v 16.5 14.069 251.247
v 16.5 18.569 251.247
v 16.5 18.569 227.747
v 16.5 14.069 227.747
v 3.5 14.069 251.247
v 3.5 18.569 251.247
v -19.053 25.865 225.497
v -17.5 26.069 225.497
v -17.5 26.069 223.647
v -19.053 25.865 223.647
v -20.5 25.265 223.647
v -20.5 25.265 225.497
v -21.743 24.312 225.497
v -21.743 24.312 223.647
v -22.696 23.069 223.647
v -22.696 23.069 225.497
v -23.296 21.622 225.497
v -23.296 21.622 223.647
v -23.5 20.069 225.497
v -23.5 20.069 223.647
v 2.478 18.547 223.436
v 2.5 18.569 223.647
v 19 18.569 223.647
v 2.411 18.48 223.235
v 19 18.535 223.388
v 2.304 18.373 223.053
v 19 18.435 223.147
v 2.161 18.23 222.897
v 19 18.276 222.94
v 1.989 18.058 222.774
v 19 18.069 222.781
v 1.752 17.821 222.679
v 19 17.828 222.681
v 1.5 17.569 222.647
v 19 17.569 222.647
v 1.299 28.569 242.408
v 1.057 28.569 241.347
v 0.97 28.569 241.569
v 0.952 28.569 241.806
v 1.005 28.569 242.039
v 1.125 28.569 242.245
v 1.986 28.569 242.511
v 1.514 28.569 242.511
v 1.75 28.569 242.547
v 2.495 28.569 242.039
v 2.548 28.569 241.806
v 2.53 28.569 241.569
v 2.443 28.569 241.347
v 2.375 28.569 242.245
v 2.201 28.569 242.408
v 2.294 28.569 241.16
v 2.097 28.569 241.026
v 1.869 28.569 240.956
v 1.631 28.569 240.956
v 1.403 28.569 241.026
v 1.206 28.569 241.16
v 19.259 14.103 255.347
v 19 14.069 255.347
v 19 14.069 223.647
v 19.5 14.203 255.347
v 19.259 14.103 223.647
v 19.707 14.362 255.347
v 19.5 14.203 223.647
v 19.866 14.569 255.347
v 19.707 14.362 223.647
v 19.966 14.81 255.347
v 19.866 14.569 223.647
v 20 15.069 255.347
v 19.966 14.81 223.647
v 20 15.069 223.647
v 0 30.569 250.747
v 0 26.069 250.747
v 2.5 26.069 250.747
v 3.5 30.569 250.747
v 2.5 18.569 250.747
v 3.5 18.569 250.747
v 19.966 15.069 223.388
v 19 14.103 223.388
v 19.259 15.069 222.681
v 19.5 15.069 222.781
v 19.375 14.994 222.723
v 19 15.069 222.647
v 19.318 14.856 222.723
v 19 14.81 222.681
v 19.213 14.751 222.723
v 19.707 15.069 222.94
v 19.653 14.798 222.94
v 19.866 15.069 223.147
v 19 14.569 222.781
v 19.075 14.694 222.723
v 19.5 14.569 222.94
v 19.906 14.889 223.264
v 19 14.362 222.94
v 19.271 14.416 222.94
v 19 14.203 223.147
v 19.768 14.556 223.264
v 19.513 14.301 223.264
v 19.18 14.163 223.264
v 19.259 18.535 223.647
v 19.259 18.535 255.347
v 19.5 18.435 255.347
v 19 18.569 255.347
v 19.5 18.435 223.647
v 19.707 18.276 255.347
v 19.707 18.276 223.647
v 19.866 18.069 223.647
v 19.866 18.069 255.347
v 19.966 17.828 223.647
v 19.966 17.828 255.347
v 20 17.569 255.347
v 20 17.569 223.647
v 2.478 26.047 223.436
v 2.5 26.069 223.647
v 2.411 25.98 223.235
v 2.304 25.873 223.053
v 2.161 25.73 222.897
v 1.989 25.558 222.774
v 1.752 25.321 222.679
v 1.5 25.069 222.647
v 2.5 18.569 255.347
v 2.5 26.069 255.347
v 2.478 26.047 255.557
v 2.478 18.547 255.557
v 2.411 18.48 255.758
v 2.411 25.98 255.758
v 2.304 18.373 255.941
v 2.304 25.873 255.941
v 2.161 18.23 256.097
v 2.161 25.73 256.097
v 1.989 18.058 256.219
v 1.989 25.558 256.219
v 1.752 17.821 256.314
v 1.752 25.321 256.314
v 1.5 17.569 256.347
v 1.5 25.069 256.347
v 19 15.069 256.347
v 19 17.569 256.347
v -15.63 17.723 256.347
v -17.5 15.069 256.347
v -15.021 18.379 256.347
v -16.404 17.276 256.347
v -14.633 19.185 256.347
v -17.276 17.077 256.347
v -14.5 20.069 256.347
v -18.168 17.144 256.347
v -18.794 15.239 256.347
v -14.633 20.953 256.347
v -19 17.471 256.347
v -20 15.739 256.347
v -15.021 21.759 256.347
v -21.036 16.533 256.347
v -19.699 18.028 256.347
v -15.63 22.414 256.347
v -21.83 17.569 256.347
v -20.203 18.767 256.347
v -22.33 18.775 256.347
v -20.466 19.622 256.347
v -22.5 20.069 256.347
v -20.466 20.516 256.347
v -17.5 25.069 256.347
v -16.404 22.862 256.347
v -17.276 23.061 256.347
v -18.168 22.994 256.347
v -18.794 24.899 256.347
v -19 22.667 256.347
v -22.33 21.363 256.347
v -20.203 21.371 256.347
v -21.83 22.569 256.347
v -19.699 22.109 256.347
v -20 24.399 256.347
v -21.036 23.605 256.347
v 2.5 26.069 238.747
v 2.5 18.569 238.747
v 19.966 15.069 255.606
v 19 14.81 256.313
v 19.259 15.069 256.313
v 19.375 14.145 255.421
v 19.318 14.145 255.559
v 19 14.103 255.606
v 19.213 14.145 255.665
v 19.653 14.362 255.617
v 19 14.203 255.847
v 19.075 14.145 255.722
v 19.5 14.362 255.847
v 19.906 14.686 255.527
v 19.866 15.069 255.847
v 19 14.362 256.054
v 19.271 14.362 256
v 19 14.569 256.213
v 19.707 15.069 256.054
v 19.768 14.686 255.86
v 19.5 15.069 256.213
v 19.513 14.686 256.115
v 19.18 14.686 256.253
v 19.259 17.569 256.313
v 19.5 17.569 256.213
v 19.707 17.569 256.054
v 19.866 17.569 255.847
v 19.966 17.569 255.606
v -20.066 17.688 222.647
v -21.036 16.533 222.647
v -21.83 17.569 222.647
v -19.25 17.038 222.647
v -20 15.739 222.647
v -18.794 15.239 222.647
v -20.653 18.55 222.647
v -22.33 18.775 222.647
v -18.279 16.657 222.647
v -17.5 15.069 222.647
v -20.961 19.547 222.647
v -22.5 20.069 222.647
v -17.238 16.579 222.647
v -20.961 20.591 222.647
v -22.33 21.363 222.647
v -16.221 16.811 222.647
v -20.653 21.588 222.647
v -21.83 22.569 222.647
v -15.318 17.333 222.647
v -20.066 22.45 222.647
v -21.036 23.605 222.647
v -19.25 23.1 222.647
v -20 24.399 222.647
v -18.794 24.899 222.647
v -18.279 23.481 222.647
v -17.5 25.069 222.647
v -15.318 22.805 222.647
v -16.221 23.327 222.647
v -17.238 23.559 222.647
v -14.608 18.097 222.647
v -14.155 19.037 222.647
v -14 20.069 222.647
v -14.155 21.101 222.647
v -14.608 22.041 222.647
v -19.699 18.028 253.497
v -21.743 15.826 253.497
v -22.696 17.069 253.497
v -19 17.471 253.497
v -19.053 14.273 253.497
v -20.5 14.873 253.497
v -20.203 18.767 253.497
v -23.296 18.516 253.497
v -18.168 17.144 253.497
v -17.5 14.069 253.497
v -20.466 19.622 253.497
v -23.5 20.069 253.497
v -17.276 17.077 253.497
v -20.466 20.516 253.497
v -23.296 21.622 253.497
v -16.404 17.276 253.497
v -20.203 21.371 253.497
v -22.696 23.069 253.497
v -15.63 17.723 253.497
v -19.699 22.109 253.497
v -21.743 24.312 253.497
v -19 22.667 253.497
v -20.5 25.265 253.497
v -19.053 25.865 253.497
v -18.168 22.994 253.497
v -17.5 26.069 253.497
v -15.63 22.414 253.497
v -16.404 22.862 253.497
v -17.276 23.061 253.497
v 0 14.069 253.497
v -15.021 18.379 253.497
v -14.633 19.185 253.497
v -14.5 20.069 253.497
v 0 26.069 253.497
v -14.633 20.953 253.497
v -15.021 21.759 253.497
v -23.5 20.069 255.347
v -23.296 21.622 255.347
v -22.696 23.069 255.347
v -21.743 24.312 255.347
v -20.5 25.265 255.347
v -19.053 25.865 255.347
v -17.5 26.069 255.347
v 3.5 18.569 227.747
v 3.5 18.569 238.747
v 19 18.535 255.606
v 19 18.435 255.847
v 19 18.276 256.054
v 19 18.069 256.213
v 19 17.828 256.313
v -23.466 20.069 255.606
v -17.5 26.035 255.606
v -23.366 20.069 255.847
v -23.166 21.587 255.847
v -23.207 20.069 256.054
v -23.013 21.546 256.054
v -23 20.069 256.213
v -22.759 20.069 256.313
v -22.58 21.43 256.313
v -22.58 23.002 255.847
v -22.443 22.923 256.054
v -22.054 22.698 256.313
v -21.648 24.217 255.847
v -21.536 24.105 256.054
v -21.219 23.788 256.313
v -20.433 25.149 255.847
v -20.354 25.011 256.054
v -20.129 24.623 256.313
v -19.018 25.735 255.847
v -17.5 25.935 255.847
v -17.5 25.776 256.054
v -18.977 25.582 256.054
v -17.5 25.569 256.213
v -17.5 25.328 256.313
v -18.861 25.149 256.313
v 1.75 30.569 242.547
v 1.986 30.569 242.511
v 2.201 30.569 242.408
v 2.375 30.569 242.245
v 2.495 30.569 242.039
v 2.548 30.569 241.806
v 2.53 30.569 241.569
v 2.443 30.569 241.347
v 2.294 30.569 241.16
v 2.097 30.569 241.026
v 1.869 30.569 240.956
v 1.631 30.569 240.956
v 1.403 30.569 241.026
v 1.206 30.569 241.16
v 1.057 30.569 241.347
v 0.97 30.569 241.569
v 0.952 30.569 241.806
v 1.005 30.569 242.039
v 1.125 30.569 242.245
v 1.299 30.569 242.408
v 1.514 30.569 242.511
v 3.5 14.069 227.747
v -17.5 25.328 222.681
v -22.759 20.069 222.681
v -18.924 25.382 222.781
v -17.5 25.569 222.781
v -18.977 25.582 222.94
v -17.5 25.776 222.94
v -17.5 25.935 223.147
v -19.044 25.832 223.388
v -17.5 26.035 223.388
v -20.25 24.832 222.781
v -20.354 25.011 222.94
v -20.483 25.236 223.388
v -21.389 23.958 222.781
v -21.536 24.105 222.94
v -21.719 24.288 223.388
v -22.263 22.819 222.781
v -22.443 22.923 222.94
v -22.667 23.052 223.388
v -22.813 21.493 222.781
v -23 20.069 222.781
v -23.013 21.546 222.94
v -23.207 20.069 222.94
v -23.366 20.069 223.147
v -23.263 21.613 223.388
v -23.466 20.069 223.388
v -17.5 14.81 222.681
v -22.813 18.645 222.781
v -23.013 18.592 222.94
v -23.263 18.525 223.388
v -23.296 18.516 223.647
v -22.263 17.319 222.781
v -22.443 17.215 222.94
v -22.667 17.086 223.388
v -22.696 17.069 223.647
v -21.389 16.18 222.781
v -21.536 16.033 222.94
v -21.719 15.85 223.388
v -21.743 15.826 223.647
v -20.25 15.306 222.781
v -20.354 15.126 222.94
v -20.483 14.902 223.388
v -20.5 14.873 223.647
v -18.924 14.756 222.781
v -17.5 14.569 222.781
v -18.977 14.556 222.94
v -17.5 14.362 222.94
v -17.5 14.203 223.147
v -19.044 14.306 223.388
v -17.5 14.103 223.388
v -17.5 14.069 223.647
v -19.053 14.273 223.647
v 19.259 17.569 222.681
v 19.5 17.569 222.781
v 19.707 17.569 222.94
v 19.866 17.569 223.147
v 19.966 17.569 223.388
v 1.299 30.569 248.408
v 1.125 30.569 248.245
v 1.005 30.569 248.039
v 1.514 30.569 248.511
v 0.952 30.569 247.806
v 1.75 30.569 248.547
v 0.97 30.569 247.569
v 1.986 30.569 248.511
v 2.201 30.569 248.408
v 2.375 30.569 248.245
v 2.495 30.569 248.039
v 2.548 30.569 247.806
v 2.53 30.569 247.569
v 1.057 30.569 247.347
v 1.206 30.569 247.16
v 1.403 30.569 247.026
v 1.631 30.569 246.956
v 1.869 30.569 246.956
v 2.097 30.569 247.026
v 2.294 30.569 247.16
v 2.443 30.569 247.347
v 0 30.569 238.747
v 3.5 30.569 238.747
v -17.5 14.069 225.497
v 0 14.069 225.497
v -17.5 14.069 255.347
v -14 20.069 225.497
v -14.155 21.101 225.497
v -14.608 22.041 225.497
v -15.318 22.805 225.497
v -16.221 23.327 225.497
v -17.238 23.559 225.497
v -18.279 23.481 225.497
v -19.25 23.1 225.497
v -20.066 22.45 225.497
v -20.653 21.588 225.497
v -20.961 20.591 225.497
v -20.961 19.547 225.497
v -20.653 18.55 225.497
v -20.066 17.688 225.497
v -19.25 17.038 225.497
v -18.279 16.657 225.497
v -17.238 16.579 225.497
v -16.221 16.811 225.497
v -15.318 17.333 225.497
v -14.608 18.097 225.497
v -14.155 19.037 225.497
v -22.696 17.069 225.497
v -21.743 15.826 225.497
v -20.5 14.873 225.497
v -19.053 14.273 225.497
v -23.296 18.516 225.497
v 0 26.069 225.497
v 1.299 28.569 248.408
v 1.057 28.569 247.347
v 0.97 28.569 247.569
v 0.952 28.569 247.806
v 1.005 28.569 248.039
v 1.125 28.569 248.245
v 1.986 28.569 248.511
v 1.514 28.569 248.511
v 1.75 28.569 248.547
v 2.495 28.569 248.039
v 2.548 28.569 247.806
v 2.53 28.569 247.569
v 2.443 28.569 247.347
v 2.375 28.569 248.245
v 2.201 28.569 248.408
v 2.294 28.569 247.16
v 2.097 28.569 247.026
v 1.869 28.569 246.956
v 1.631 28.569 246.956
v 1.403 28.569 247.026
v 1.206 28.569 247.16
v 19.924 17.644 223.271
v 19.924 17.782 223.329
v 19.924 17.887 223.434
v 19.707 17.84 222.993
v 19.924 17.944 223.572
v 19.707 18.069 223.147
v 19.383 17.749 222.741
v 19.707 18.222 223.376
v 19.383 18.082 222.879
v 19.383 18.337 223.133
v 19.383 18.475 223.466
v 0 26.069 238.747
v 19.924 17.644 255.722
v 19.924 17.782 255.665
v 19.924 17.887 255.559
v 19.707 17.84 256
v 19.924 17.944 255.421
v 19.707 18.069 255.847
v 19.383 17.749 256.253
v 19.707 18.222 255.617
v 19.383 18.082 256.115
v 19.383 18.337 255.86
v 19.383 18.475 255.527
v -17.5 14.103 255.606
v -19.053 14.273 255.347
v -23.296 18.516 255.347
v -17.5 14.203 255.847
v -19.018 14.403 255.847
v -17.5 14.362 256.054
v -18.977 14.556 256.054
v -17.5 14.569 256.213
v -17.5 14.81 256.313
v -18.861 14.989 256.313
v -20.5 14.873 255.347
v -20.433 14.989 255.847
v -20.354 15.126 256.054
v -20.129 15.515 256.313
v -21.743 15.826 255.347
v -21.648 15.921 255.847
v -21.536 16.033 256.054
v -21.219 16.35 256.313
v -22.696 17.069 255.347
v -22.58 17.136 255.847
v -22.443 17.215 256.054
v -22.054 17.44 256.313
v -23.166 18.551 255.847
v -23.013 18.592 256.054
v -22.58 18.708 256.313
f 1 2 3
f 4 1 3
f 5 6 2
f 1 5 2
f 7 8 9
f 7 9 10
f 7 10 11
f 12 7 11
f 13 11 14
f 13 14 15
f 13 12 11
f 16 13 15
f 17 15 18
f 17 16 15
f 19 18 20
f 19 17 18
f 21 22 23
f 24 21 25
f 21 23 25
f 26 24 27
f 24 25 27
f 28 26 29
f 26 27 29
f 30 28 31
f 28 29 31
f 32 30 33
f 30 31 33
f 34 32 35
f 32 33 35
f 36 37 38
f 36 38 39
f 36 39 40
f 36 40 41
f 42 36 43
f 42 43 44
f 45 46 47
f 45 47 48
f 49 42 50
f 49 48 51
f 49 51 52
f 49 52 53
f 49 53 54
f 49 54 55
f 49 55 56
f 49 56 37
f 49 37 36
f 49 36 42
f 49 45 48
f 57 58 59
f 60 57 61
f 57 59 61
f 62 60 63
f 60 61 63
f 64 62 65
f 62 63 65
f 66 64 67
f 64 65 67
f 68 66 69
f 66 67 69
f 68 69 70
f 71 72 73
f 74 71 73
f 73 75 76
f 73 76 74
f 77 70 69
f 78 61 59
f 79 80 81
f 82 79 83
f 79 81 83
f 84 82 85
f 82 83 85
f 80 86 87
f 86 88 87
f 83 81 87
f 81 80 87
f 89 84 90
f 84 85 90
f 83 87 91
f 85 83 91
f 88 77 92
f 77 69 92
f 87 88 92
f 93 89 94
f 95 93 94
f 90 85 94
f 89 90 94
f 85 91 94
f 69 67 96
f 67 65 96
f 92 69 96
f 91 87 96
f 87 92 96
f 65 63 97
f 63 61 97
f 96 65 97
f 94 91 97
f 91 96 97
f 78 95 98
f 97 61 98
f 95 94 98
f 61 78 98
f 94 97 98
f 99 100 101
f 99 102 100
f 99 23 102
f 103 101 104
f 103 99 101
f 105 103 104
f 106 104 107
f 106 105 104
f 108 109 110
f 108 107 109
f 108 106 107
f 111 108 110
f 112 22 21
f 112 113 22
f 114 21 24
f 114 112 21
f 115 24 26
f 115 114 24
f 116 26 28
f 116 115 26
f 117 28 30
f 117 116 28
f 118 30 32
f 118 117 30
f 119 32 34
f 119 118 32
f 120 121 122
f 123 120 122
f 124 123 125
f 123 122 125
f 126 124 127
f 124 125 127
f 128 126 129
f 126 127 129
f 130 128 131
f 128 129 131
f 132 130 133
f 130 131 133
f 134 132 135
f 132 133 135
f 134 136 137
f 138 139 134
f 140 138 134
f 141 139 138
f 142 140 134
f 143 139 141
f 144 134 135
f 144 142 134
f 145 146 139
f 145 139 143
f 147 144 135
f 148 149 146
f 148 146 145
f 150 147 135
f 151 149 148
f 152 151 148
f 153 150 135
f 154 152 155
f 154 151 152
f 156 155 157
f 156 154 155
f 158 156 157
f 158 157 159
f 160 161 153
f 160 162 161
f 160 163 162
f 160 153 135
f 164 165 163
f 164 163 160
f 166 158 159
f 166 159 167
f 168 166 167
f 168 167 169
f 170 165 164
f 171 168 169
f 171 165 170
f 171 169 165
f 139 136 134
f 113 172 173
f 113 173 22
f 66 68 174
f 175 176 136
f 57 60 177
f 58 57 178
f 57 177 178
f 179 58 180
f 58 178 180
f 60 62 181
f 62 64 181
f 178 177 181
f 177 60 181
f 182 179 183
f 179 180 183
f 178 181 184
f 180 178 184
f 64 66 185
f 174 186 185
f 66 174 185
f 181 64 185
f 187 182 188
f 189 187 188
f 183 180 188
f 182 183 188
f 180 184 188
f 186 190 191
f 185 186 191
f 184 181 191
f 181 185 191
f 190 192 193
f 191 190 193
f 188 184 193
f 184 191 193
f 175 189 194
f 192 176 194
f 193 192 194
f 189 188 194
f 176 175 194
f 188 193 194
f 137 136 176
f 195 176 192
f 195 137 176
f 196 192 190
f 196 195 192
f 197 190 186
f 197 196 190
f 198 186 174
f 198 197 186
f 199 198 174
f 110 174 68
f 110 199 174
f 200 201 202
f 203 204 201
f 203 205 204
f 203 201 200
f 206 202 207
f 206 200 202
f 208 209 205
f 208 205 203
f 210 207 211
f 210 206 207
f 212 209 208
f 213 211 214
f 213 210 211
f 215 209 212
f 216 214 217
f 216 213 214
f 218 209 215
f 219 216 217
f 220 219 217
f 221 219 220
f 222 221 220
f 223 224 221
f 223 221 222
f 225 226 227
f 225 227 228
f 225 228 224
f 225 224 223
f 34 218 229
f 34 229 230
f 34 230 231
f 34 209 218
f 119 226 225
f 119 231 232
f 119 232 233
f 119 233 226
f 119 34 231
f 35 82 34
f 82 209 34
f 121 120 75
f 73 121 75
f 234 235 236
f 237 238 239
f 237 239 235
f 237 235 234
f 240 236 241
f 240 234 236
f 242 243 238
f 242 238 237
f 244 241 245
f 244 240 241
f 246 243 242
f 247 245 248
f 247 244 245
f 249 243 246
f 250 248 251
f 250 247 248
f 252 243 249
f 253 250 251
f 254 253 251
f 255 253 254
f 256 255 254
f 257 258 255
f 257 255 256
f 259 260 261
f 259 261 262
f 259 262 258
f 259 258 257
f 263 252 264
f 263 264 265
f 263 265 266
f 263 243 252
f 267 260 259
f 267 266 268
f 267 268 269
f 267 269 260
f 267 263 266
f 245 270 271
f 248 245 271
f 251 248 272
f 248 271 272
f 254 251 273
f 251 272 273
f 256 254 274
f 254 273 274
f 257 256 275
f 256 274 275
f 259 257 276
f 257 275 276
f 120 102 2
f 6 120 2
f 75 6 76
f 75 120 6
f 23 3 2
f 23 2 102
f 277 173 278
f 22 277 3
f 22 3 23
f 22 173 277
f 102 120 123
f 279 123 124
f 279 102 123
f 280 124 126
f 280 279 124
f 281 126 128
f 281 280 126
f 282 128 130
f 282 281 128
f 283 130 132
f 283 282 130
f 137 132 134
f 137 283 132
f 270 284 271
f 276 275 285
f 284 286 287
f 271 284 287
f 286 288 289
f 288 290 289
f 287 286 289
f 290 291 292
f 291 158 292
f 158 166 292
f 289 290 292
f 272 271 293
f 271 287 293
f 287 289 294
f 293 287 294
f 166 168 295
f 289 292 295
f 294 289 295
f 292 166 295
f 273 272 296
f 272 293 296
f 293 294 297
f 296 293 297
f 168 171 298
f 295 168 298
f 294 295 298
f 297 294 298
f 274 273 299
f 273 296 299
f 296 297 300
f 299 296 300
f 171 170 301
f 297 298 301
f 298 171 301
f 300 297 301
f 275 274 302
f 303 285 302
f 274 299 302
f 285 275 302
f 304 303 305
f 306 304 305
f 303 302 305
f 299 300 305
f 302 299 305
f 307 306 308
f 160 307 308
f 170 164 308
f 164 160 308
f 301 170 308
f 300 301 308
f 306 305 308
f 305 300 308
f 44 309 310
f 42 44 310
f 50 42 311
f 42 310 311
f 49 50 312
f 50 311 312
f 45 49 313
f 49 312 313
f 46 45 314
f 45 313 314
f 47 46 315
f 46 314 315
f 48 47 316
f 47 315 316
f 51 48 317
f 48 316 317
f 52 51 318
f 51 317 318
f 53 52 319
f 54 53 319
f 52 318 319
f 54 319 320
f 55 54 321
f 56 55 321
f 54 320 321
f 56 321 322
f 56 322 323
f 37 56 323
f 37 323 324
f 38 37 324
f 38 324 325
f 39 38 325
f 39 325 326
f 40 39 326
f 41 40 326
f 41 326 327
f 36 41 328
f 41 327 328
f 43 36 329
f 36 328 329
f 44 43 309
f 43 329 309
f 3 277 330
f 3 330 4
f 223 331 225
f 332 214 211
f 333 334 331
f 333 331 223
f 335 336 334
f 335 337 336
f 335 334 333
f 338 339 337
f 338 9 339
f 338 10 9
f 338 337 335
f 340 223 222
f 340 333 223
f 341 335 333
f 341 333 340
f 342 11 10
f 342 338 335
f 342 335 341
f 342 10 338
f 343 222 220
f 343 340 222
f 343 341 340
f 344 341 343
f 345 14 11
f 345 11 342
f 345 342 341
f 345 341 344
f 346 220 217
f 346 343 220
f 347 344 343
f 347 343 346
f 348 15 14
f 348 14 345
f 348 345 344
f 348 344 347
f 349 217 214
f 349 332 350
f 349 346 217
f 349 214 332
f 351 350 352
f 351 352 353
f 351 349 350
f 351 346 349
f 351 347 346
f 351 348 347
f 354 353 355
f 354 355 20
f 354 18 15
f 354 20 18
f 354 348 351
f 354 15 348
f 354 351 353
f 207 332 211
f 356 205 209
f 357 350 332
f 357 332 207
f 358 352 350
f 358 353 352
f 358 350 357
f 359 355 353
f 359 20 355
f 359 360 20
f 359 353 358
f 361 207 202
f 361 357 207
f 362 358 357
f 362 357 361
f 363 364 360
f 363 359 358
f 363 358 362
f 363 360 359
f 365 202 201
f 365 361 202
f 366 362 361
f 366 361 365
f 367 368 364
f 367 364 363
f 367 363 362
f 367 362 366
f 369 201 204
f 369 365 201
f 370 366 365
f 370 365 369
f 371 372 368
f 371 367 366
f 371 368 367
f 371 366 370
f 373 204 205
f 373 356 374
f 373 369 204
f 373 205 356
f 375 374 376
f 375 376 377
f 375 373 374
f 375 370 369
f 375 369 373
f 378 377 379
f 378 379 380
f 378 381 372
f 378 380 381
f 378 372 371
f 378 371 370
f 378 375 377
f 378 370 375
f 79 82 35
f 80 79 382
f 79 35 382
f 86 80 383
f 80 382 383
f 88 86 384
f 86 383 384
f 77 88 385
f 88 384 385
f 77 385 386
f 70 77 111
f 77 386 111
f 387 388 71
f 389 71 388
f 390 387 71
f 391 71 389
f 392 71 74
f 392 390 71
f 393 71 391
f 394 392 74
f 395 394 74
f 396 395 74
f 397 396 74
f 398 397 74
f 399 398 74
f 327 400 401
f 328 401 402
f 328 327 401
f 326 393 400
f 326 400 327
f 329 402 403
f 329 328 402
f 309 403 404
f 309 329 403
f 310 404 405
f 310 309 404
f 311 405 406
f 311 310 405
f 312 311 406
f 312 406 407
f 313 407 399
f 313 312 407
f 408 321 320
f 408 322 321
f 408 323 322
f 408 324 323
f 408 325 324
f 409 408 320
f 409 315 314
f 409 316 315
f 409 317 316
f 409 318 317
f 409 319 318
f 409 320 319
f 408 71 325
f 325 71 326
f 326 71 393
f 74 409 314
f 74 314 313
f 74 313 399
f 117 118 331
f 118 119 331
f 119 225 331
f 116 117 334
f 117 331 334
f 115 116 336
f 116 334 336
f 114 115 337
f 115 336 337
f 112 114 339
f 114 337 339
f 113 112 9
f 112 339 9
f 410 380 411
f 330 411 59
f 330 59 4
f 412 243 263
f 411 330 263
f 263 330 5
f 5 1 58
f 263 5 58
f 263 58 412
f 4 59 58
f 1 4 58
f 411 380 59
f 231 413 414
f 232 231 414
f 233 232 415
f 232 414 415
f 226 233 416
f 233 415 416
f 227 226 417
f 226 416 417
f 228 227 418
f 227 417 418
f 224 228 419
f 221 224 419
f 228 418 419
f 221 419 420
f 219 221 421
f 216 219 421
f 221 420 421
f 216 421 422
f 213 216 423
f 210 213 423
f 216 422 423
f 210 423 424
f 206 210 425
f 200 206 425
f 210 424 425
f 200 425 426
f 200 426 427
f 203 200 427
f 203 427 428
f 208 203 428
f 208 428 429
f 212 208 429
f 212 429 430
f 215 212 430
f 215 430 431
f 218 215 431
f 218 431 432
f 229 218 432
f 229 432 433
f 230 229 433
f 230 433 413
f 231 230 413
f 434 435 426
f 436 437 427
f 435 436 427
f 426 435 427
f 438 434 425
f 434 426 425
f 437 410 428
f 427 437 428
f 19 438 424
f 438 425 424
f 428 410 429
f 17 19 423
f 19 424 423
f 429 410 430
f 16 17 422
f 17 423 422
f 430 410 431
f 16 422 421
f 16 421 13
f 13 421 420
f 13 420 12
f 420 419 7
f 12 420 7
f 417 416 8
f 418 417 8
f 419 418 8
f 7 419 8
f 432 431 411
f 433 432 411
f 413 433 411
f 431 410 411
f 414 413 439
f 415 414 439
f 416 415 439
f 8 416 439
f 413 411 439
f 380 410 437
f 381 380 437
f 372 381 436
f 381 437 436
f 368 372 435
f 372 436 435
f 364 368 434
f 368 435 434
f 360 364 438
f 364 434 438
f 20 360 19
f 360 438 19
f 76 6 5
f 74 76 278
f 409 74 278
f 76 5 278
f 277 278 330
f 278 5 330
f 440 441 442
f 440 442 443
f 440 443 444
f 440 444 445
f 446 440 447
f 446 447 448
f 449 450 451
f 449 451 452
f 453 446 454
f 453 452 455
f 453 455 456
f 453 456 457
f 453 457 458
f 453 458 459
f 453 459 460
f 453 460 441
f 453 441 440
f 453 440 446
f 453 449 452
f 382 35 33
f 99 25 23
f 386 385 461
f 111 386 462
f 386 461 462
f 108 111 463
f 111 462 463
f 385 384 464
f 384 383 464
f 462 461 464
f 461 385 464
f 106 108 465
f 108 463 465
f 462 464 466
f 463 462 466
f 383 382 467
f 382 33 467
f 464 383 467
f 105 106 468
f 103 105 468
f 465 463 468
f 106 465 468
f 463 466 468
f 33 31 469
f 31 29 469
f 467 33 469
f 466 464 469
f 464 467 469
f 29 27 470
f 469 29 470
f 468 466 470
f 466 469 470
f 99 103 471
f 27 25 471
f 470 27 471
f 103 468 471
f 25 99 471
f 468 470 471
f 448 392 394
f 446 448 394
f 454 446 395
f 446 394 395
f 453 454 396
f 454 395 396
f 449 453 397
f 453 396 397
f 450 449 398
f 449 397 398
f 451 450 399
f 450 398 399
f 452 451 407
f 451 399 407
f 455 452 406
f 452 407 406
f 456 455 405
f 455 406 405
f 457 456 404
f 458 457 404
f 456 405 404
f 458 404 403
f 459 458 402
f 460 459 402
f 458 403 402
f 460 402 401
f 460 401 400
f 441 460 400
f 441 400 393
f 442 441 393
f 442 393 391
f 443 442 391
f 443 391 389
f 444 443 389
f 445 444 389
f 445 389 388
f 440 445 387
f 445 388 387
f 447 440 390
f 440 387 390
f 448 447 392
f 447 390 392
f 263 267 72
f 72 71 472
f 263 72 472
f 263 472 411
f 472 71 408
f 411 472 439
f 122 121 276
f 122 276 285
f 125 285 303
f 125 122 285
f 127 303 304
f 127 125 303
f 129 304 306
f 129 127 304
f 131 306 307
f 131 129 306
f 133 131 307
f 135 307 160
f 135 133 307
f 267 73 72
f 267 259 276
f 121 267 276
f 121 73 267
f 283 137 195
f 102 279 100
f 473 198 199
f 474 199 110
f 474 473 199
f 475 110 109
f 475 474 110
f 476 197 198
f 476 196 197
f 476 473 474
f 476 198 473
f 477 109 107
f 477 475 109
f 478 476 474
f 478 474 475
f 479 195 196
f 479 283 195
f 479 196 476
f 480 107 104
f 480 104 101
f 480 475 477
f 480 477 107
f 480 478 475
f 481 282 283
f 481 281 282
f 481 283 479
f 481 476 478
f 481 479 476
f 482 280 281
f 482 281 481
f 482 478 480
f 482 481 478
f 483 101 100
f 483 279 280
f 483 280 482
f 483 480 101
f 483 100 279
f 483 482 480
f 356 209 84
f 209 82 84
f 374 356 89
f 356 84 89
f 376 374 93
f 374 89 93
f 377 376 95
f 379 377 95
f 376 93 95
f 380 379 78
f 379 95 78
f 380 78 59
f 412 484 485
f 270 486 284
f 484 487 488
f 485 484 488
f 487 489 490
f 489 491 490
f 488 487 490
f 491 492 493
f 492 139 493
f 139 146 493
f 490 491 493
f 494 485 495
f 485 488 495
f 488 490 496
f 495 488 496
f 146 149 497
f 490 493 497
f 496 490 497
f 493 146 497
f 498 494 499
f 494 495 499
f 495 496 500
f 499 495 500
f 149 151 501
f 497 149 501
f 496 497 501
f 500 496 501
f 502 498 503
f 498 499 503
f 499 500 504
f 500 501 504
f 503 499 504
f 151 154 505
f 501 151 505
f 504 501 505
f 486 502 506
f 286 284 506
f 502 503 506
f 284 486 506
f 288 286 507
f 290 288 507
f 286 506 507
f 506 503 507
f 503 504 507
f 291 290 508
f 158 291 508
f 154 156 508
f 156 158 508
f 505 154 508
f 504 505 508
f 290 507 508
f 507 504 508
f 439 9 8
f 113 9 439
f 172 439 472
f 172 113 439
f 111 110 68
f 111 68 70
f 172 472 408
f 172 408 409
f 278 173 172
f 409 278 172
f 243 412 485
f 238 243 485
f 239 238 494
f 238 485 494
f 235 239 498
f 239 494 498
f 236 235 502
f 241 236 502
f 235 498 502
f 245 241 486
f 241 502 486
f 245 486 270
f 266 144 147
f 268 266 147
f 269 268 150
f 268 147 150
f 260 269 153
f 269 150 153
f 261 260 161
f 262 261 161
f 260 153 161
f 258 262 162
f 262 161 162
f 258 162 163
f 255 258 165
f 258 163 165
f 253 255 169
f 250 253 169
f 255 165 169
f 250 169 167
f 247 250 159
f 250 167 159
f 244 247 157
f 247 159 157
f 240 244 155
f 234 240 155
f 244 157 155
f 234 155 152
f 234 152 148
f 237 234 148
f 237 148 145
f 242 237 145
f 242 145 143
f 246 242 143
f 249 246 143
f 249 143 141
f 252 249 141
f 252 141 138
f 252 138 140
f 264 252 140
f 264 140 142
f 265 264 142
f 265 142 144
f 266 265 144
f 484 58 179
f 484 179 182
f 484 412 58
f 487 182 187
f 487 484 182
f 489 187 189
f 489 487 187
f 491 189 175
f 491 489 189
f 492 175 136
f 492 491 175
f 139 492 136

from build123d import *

# Parameters (mm, degrees)
SKETCH1_W           = 33.7
SKETCH1_H           = 12
BOSS_EXTRUDE1_DEPTH = 2.5
SKETCH2_W           = 33.7
SKETCH2_H           = 4.5
BOSS_EXTRUDE2_DEPTH = 17.5
SKETCH3_W           = 13
SKETCH3_H           = 23.5
CUT_EXTRUDE1_DEPTH  = 258.235074474
SKETCH4_W           = 2.85
SKETCH4_H           = 12
BOSS_EXTRUDE3_DEPTH = 23.5
FILLET1_R           = 6
SKETCH5_R           = 3
CUT_EXTRUDE2_DEPTH  = 4
SKETCH6_R           = 3.5
CUT_EXTRUDE3_DEPTH  = 4
SKETCH7_W           = 3.5
SKETCH7_H           = 12
BOSS_EXTRUDE4_DEPTH = 12
FILLET2_R           = 1
SKETCH8_R           = 0.800000001
CUT_EXTRUDE4_DEPTH  = 2


with BuildPart() as part:
    # Sketch1 → Boss-Extrude1 (new body)
    with BuildSketch(Plane(origin=(0, 0, 0), x_dir=(0, 0, -1), z_dir=(1, 0, 0))):
        with Locations((-239.496705732, 20.068965517)):
            Rectangle(SKETCH1_W, SKETCH1_H)
    extrude(amount=BOSS_EXTRUDE1_DEPTH)

    # Sketch2 → Boss-Extrude2 (add)
    with BuildSketch(Plane(origin=(2.5, 0, 0), x_dir=(0, 0, -1), z_dir=(1, 0, 0))):
        with Locations((-239.496705732, 16.318965517)):
            Rectangle(SKETCH2_W, SKETCH2_H)
    extrude(amount=BOSS_EXTRUDE2_DEPTH)

    # Sketch3 → Cut-Extrude1 (cut, through all)
    with BuildSketch(Plane(origin=(0, 18.568965517, 0), x_dir=(1, 0, 0), z_dir=(0, 1, 0))):
        with Locations((10, -239.496705732)):
            Rectangle(SKETCH3_W, SKETCH3_H)
    extrude(amount=-CUT_EXTRUDE1_DEPTH, mode=Mode.SUBTRACT)

    # Sketch4 → Boss-Extrude3 (add)
    with BuildSketch(Plane.ZY):
        with Locations((224.071705732, 20.068965517)):
            Rectangle(SKETCH4_W, SKETCH4_H)
        with Locations((254.921705732, 20.068965517)):
            Rectangle(SKETCH4_W, SKETCH4_H)
    extrude(amount=BOSS_EXTRUDE3_DEPTH)

    # Fillet1
    fillet1_edges = [part.edges().sort_by_distance(p)[0] for p in [
        (-23.5, 14.068965517, 224.071705732),
        (-23.5, 26.068965517, 224.071705732),
        (-23.5, 14.068965517, 254.921705732),
        (-23.5, 26.068965517, 254.921705732),
    ]]
    fillet(fillet1_edges, radius=FILLET1_R - 0.0001)  # a hair under: the kernel refuses the full size

    # Sketch5 → Cut-Extrude2 (cut)
    with BuildSketch(Plane.XY.offset(256.346705732)):
        with Locations((-17.5, 20.068965517)):
            Circle(SKETCH5_R)
    extrude(amount=-CUT_EXTRUDE2_DEPTH, mode=Mode.SUBTRACT)

    # Sketch6 → Cut-Extrude3 (cut)
    with BuildSketch(Plane.XY.offset(225.496705732)):
        with Locations((-17.5, 20.068965517)):
            Circle(SKETCH6_R)
    extrude(amount=-CUT_EXTRUDE3_DEPTH, mode=Mode.SUBTRACT)

    # Sketch7 → Boss-Extrude4 (add)
    with BuildSketch(Plane(origin=(0, 18.568965517, 0), x_dir=(1, 0, 0), z_dir=(0, 1, 0))):
        with Locations((1.75, -244.746705732)):
            Rectangle(SKETCH7_W, SKETCH7_H)
    extrude(amount=BOSS_EXTRUDE4_DEPTH)

    # Fillet2
    fillet2_edges = [part.edges().sort_by_distance(p)[0] for p in [
        (2.5, 22.318965517, 222.646705732),
        (11.25, 18.568965517, 256.346705732),
        (11.25, 18.568965517, 222.646705732),
        (20, 16.318965517, 256.346705732),
        (20, 14.068965517, 239.496705732),
        (20, 16.318965517, 222.646705732),
        (20, 18.568965517, 239.496705732),
        (2.5, 22.318965517, 256.346705732),
        (-21.742669976, 24.311635494, 222.646705732),
        (-21.742669976, 15.826295541, 222.646705732),
        (-21.742669976, 24.311635494, 256.346705732),
        (-21.742669976, 15.826295541, 256.346705732),
        (-7.50005, 26.068965517, 256.346705732),
        (-7.50005, 26.068965517, 222.646705732),
        (1.24995, 14.068965517, 222.646705732),
        (1.24995, 14.068965517, 256.346705732),
    ]]
    fillet(fillet2_edges, radius=FILLET2_R)

    # Sketch8 → Cut-Extrude4 (cut)
    with BuildSketch(Plane(origin=(0, 30.568965517, 0), x_dir=(1, 0, 0), z_dir=(0, 1, 0))):
        with Locations(Location((1.75, -247.746705734, 0), (0, 0, 270))):
            Circle(SKETCH8_R)
        with Locations(Location((1.75, -241.746705734, 0), (0, 0, 270))):
            Circle(SKETCH8_R)
    extrude(amount=-CUT_EXTRUDE4_DEPTH, mode=Mode.SUBTRACT)


solid = part.part
